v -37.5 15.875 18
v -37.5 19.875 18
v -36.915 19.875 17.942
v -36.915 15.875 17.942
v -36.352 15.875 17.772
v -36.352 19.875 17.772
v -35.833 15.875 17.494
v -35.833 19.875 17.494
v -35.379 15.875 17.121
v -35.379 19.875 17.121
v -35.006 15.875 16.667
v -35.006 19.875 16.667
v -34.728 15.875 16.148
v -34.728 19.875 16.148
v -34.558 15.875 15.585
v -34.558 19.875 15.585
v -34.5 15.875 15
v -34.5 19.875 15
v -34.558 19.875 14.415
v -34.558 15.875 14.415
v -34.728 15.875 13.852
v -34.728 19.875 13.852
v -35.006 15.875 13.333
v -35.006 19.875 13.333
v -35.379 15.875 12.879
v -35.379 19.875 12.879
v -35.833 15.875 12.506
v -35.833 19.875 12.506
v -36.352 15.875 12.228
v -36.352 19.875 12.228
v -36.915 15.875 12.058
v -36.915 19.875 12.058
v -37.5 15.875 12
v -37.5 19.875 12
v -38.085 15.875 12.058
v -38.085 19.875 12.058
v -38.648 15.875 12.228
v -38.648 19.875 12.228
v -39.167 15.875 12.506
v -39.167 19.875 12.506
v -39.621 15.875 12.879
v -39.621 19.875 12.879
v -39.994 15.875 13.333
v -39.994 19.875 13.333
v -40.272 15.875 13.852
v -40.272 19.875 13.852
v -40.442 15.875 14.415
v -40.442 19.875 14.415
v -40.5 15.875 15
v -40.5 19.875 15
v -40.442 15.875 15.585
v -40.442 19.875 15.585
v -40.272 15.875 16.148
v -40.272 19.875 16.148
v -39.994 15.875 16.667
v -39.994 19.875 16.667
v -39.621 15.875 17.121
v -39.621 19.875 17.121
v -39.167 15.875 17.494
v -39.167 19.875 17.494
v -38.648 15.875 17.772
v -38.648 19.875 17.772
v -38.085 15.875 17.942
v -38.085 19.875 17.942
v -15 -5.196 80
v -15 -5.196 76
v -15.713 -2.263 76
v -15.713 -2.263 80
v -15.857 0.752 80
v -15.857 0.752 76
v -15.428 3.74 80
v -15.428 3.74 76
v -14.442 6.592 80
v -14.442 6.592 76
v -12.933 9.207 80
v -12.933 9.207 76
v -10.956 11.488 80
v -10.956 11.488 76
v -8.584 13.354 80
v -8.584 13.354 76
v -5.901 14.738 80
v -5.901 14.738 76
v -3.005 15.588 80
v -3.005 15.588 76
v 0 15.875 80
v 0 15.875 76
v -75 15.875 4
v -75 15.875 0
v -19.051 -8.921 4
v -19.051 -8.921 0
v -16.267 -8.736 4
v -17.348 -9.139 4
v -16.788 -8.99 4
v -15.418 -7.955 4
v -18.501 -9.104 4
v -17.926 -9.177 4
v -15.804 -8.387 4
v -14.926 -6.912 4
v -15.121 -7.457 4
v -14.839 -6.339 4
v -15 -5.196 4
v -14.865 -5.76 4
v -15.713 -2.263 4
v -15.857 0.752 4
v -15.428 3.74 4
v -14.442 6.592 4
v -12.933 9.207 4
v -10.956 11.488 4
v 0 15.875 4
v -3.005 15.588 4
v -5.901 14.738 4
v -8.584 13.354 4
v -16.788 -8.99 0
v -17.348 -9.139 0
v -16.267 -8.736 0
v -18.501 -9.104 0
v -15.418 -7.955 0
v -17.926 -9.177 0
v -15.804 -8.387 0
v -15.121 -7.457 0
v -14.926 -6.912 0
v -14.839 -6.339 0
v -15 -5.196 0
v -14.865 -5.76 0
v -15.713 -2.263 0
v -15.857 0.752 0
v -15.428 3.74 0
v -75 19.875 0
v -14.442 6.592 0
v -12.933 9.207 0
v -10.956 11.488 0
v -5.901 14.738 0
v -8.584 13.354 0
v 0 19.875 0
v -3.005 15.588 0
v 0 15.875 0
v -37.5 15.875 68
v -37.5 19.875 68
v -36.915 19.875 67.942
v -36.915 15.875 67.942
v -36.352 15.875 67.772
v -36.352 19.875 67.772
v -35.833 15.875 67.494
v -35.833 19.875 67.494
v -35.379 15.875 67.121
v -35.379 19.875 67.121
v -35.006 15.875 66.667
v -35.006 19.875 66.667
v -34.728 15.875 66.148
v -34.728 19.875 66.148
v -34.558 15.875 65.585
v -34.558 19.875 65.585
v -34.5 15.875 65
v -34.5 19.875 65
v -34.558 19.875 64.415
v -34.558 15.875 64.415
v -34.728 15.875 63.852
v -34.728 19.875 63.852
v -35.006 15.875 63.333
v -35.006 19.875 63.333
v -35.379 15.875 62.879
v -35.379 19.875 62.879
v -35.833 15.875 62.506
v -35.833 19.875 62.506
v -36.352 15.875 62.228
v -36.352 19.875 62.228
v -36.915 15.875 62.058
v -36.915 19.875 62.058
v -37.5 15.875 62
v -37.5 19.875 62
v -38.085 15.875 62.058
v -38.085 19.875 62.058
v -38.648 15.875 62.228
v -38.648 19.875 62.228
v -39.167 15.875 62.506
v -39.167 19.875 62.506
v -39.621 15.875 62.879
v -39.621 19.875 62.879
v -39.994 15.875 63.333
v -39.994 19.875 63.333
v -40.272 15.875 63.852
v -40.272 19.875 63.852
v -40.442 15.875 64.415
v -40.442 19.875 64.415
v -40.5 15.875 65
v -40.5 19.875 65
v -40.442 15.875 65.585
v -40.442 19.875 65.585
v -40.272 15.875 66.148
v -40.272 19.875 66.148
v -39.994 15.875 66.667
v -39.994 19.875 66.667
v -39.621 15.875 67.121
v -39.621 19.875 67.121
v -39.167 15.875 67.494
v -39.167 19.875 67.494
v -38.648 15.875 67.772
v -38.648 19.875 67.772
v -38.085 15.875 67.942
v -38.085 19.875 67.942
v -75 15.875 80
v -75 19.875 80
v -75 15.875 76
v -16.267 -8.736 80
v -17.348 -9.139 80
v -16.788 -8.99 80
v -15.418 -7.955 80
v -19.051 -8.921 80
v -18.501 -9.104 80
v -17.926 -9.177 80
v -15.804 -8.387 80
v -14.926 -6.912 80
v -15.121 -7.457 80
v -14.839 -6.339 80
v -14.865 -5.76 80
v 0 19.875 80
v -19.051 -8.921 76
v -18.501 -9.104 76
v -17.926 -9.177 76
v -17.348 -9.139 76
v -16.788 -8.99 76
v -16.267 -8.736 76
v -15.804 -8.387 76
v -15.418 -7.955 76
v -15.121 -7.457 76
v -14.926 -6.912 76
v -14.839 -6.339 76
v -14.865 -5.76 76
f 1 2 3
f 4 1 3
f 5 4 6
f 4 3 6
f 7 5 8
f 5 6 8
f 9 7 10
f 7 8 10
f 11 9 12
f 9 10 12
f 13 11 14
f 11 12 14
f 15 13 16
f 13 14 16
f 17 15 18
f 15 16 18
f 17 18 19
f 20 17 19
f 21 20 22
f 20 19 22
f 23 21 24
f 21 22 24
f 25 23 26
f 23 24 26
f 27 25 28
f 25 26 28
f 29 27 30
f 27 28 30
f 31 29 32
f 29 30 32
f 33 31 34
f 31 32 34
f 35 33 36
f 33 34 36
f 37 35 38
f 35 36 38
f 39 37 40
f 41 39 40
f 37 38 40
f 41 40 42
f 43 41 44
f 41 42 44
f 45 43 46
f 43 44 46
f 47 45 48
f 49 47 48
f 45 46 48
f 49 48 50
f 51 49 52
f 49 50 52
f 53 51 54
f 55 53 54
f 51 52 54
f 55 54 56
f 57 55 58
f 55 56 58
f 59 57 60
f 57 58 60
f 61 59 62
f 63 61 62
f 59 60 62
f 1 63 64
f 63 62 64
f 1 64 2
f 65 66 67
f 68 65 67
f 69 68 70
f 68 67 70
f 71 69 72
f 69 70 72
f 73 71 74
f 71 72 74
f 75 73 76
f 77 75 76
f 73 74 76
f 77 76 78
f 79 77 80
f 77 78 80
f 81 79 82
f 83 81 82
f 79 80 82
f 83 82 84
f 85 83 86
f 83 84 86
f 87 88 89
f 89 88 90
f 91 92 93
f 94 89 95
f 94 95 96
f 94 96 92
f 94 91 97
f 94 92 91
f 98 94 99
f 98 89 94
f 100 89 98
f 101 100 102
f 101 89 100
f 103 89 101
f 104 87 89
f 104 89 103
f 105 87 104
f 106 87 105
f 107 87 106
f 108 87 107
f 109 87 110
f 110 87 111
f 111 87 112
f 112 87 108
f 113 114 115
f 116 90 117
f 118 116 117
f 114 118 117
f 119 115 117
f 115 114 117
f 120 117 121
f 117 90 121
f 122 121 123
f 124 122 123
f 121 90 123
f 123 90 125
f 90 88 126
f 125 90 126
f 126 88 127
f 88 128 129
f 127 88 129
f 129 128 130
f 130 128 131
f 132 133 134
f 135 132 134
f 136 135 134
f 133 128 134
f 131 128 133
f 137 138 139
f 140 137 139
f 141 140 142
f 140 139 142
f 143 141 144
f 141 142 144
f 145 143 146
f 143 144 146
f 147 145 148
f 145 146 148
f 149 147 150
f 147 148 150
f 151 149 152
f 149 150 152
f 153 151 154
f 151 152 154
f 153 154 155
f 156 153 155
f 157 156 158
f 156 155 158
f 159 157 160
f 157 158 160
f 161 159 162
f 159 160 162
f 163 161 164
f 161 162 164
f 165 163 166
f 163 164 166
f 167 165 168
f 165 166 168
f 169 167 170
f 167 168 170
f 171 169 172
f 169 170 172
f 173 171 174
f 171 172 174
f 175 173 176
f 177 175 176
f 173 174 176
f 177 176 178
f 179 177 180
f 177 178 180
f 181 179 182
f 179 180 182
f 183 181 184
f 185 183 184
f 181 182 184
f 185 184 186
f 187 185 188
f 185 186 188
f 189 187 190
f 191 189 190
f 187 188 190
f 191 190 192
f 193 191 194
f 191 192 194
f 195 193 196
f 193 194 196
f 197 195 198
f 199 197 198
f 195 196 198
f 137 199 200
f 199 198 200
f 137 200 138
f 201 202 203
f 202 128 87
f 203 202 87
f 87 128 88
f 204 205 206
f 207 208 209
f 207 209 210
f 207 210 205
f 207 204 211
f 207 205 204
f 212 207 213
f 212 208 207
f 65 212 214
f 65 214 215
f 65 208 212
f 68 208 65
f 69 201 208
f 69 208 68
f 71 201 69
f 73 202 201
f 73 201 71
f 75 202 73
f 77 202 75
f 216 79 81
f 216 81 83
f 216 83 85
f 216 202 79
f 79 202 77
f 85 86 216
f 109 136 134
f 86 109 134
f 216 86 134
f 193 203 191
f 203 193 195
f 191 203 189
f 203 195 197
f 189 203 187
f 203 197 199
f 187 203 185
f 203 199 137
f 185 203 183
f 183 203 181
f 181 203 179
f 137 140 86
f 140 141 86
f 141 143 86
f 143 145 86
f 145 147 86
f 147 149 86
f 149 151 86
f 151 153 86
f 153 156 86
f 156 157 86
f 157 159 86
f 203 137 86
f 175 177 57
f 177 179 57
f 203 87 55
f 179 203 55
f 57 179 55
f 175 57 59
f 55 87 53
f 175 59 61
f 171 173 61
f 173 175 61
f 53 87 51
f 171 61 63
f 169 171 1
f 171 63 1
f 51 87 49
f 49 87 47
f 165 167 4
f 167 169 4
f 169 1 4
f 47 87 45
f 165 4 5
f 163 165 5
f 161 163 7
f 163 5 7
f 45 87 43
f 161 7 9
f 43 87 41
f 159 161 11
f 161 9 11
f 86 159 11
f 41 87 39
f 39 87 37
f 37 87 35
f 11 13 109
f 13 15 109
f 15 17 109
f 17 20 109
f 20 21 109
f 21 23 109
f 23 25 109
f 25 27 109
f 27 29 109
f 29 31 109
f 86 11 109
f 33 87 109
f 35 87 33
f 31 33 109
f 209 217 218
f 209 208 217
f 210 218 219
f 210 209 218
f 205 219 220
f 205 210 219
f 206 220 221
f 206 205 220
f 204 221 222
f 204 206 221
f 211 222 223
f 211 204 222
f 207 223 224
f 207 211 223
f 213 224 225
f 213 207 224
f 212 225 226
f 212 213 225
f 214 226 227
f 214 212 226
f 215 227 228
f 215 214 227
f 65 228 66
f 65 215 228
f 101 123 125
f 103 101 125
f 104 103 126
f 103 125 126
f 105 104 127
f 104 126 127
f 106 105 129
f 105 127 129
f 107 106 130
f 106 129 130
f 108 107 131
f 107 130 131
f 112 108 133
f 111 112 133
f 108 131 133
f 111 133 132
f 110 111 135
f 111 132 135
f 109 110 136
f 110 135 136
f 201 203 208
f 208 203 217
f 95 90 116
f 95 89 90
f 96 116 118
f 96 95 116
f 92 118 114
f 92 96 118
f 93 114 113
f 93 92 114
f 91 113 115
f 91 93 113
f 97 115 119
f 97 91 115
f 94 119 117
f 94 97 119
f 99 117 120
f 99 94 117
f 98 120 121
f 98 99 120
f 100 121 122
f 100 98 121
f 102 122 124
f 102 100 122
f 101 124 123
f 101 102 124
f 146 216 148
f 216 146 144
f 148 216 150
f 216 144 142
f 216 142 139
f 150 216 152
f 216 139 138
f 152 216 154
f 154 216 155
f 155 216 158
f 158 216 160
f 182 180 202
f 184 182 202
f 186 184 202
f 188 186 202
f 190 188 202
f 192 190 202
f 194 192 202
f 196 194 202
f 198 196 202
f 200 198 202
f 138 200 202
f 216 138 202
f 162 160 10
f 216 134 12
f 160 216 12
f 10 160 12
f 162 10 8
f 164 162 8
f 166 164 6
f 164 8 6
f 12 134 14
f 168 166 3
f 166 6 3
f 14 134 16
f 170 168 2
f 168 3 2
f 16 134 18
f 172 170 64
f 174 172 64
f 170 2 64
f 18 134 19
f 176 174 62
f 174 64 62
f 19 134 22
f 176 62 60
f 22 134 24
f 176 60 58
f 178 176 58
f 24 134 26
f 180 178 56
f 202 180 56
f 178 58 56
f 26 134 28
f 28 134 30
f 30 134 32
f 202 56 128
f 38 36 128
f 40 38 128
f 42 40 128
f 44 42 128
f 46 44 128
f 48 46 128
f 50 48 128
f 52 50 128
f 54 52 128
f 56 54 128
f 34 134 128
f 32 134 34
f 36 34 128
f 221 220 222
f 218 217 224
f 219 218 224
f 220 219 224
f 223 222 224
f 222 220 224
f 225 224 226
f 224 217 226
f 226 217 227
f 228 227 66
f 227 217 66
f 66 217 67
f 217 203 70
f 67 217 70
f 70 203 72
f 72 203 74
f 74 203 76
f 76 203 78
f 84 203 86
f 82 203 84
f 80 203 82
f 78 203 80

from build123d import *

# Parameters (mm, degrees)
BOSS_EXTRUDE1_DEPTH = 4
SKETCH2_W           = 75
SKETCH2_H           = 4
BOSS_EXTRUDE2_DEPTH = 72
BOSS_EXTRUDE3_DEPTH = 4
SKETCH5_R           = 3
CUT_EXTRUDE1_DEPTH  = 4
FILLET1_R           = 3


with BuildPart() as part:
    # Sketch1 → Boss-Extrude1 (new body)
    with BuildSketch(Plane.XY):
        with BuildLine():
            Line((0, 15.875), (0, 19.875))
            Line((0, 19.875), (-75, 19.875))
            Line((-75, 19.875), (-75, 15.875))
            Line((-75, 15.875), (-6.432235, -14.51351))
            ThreePointArc((-6.432235, -14.51351), (-15.530898, 3.287373), (0, 15.875))
        make_face()
    extrude(amount=BOSS_EXTRUDE1_DEPTH)

    # Sketch2 → Boss-Extrude2 (add)
    with BuildSketch(Plane.XY.offset(4)):
        with Locations((-37.5, 17.875)):
            Rectangle(SKETCH2_W, SKETCH2_H)
    extrude(amount=BOSS_EXTRUDE2_DEPTH)

    # Sketch4 → Boss-Extrude3 (add)
    with BuildSketch(Plane.XY.offset(76)):
        with BuildLine():
            Line((-75, 19.875), (-75, 15.875))
            Line((-75, 15.875), (-6.432235, -14.51351))
            ThreePointArc((-6.432235, -14.51351), (-15.530898, 3.287373), (0, 15.875))
            Line((0, 15.875), (0, 19.875))
            Line((0, 19.875), (-75, 19.875))
        make_face()
    extrude(amount=BOSS_EXTRUDE3_DEPTH)

    # Sketch5 → Cut-Extrude1 (cut)
    with BuildSketch(Plane(origin=(0, 19.875, 0), x_dir=(1, 0, 0), z_dir=(0, 1, 0))):
        with Locations(Location((-37.5, -15, 0), (0, 0, 270))):
            Circle(SKETCH5_R)
        with Locations(Location((-37.5, -65, 0), (0, 0, 270))):
            Circle(SKETCH5_R)
    extrude(amount=-CUT_EXTRUDE1_DEPTH, mode=Mode.SUBTRACT)

    # Fillet1
    fillet1_edges = [part.edges().sort_by_distance(p)[0] for p in [
        (-6.432235, -14.51351, 78),
        (-6.432235, -14.51351, 2),
    ]]
    fillet(fillet1_edges, radius=FILLET1_R)


solid = part.part
